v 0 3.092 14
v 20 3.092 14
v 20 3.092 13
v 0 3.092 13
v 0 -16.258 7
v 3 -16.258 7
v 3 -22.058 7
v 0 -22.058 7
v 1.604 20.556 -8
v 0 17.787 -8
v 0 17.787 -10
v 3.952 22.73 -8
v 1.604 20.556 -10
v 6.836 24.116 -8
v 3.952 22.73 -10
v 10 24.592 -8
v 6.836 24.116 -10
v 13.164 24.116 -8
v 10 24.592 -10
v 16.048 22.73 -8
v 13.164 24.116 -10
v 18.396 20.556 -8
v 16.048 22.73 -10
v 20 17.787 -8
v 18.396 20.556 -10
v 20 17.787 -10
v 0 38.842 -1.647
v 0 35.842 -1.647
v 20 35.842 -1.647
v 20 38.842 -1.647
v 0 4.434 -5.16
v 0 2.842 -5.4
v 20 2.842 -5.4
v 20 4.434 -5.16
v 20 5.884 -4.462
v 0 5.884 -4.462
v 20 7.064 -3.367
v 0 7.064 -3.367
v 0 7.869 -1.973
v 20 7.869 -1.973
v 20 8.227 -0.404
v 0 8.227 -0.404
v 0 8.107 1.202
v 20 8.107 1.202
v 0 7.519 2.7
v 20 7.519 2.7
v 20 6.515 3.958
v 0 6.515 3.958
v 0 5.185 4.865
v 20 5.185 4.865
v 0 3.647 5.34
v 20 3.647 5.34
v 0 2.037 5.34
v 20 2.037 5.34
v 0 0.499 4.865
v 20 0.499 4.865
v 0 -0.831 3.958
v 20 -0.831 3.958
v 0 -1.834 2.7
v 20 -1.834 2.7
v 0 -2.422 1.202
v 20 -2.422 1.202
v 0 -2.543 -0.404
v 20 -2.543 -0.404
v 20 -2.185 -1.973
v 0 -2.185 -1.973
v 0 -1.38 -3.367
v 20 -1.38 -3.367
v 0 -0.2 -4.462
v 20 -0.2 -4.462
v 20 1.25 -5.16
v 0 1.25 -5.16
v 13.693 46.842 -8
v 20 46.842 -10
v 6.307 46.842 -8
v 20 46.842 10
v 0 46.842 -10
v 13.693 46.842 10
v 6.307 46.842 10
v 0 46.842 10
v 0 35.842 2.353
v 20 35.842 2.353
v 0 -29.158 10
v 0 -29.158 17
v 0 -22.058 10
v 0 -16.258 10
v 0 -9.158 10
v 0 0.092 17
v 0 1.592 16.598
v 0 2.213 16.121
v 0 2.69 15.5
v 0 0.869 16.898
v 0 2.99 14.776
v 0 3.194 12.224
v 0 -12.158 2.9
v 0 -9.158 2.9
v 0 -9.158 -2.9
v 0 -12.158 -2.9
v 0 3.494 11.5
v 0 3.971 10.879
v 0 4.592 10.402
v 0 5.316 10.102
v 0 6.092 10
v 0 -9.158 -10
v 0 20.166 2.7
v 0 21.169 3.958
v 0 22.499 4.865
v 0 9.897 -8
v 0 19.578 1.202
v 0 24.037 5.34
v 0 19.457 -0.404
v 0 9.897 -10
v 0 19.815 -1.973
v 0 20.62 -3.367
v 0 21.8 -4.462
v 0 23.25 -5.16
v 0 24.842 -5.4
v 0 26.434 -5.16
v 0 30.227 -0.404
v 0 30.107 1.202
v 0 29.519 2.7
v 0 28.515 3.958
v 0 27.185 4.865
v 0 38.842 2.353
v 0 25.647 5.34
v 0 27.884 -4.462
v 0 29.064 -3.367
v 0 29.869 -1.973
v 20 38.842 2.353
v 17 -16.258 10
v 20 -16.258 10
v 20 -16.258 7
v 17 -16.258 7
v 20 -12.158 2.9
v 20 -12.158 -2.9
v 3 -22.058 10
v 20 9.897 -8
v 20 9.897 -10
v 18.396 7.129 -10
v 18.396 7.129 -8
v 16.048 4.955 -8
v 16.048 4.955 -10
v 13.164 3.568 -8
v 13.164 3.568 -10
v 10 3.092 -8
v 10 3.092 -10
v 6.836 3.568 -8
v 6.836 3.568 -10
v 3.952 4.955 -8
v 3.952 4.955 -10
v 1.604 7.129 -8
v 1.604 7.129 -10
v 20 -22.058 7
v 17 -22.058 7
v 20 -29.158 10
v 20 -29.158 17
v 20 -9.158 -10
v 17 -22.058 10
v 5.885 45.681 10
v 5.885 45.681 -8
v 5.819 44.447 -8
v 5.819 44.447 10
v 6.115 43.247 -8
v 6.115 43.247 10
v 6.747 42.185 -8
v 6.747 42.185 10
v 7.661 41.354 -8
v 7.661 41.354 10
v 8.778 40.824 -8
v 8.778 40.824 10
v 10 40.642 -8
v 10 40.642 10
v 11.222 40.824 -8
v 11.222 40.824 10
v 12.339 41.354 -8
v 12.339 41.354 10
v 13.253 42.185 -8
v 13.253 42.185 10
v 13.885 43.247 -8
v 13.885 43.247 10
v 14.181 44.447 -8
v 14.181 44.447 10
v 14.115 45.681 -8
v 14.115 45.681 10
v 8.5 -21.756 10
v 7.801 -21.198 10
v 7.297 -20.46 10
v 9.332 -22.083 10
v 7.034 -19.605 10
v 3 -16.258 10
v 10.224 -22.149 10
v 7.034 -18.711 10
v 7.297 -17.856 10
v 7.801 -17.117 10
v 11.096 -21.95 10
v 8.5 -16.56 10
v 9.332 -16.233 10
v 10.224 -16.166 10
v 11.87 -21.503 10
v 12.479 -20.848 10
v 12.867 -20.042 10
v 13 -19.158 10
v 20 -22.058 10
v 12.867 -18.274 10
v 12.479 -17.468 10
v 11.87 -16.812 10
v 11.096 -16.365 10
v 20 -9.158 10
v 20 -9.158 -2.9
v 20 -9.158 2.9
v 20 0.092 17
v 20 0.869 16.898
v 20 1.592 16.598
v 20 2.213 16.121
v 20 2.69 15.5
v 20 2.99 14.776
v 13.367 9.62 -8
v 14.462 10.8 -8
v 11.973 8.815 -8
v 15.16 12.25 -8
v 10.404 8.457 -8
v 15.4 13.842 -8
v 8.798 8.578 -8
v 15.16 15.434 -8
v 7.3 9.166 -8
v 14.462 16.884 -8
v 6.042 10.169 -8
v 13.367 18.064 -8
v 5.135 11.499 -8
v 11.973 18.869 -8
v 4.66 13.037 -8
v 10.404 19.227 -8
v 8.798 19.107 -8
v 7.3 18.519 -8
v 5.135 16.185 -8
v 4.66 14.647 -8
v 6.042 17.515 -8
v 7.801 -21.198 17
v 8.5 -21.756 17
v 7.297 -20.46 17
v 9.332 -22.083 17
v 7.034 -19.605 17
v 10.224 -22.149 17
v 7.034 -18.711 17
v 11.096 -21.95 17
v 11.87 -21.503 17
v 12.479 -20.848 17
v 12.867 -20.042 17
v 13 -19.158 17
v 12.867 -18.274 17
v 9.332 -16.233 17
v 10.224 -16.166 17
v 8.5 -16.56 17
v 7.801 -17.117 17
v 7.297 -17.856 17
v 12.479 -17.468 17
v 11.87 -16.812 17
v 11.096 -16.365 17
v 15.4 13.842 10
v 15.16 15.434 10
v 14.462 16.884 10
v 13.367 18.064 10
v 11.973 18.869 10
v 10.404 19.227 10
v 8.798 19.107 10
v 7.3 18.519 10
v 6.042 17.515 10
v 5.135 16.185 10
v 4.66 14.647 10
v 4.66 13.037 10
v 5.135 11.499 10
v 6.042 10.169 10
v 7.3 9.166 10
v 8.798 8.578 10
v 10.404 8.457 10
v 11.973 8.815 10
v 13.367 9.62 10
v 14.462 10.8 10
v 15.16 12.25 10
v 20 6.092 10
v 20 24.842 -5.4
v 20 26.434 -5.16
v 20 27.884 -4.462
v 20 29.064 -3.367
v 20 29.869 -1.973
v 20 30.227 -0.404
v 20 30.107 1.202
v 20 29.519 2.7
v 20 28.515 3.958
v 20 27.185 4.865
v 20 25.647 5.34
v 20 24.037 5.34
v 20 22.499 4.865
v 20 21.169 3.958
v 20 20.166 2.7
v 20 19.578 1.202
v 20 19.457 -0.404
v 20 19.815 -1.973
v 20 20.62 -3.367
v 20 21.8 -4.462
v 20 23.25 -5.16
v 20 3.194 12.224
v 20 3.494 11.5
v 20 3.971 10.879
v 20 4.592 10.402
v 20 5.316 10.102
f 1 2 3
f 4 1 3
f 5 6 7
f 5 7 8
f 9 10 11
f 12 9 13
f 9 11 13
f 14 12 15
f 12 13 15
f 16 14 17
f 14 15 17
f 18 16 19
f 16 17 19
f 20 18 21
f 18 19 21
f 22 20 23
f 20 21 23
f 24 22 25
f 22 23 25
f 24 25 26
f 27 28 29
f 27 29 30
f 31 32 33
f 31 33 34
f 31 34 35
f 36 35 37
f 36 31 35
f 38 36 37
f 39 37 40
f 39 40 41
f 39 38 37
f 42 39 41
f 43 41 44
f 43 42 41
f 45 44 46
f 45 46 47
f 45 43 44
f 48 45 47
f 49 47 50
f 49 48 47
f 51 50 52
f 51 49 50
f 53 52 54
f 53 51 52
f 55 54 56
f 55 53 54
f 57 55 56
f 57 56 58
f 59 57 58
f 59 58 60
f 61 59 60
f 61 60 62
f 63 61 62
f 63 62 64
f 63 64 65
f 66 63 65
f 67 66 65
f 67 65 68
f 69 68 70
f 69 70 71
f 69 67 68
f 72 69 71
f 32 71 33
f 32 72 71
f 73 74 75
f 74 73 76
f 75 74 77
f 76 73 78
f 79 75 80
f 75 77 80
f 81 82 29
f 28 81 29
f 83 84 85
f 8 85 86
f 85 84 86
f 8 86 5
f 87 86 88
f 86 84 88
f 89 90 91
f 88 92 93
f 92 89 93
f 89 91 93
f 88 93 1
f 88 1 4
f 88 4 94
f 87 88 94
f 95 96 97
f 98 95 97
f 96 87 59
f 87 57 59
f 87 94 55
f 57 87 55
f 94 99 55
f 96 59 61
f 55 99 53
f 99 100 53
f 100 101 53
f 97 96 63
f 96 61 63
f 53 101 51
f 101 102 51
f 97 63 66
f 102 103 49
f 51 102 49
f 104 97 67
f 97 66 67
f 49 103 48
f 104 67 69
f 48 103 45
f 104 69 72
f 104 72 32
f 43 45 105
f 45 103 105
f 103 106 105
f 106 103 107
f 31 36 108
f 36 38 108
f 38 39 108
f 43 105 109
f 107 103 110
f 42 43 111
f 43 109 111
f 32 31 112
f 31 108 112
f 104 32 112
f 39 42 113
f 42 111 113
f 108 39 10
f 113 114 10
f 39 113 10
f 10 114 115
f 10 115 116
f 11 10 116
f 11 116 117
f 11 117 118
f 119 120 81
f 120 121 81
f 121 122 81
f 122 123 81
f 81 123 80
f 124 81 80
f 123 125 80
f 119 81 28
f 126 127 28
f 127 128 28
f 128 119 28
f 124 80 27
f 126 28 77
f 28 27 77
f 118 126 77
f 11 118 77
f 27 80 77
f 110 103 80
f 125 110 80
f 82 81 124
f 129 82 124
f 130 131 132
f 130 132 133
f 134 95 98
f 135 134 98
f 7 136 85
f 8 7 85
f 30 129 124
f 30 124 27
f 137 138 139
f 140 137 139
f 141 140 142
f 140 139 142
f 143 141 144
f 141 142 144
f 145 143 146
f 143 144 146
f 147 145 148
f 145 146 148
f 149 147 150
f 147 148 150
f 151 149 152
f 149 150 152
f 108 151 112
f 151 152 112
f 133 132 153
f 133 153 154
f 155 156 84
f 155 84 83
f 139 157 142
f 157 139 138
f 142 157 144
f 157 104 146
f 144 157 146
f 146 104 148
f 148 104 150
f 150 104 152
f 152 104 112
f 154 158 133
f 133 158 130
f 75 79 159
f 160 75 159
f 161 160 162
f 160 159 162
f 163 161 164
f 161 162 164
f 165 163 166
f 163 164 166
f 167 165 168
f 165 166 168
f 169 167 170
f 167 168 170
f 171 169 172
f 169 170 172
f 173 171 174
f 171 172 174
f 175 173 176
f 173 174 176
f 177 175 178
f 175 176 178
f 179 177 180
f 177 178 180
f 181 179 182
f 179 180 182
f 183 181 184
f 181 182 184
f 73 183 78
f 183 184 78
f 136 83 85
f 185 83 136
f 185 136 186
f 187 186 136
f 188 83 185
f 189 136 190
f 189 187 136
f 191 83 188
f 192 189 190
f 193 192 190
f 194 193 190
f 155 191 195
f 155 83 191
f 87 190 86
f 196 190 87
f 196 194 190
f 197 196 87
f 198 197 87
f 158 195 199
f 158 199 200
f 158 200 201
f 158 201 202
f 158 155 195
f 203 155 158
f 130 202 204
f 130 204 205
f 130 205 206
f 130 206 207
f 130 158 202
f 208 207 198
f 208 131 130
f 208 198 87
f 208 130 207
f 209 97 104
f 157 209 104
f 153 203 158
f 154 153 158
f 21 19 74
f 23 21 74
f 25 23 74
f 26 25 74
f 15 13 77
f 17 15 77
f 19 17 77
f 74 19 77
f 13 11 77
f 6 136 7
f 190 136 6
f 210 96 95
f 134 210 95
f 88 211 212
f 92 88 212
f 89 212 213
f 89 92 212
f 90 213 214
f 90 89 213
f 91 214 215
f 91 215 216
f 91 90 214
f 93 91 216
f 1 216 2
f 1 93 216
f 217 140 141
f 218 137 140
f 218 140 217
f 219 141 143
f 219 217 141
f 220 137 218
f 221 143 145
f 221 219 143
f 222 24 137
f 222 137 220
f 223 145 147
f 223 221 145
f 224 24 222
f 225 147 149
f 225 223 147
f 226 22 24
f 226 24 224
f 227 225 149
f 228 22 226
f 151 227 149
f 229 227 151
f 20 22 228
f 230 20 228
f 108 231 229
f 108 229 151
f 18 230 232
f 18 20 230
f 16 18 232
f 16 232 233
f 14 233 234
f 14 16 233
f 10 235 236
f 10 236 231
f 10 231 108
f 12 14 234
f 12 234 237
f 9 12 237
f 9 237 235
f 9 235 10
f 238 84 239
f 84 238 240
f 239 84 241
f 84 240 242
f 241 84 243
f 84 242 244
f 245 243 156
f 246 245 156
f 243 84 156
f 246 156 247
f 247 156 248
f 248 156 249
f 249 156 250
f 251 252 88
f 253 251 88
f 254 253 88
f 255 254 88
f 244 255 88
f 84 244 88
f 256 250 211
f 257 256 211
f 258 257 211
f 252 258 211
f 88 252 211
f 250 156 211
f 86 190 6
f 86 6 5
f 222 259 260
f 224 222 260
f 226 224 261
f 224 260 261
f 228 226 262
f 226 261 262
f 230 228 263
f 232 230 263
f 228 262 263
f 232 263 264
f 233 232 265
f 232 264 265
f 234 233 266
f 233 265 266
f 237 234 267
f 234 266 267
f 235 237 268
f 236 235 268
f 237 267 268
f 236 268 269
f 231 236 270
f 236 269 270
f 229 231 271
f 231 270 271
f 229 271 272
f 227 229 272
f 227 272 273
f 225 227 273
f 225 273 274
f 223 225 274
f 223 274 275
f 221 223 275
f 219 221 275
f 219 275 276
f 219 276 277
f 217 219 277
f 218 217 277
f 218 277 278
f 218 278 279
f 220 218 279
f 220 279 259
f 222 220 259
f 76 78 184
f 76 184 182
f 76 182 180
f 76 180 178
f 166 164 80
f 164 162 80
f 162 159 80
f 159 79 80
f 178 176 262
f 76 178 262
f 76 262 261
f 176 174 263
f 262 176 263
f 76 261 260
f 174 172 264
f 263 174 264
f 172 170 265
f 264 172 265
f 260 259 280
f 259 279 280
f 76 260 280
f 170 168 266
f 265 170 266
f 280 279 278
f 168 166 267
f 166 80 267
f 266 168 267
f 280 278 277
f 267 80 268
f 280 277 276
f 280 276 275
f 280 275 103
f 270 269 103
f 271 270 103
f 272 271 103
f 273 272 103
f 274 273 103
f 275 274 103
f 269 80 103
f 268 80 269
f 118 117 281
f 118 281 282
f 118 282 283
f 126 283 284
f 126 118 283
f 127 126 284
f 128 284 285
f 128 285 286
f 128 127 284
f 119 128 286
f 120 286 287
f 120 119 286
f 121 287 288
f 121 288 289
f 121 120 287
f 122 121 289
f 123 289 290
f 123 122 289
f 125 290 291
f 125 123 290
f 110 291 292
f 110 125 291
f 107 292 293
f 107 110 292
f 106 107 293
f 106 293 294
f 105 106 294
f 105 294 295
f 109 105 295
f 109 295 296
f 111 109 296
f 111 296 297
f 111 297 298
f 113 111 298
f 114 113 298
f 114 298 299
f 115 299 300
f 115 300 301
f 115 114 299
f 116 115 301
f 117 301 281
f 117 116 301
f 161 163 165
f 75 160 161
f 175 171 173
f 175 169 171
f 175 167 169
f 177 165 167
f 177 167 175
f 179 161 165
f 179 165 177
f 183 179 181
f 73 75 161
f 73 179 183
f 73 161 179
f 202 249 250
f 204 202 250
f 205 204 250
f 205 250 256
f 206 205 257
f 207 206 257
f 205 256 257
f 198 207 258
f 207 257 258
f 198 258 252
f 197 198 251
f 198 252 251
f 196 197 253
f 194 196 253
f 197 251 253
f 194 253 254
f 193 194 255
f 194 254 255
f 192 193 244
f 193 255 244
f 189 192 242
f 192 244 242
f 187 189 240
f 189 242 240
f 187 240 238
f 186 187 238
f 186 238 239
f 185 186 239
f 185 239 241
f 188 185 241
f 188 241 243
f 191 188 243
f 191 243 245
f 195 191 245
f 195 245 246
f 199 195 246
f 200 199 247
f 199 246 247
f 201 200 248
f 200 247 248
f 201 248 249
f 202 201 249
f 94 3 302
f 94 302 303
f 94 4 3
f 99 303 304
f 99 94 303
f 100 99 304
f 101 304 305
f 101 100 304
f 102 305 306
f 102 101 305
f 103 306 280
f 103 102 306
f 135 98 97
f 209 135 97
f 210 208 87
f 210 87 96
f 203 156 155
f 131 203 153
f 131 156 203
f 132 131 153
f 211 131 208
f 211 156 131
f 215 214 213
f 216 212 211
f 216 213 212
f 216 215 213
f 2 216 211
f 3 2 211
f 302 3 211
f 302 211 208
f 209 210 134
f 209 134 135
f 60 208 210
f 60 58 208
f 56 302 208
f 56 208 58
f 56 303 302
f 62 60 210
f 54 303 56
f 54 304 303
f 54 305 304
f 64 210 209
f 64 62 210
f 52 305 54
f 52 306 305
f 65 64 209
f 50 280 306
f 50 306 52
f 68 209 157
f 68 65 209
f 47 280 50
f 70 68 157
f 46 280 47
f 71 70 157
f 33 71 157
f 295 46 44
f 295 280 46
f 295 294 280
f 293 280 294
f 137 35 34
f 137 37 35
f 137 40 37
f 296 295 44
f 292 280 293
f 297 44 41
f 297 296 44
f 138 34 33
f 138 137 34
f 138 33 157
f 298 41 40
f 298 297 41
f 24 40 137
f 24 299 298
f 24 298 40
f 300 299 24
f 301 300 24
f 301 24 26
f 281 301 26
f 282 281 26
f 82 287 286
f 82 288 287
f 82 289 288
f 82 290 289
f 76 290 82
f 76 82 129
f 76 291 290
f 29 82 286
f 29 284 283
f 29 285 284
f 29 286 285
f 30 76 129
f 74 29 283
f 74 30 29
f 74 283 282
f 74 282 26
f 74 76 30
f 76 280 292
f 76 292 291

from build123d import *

# Parameters (mm, degrees)
SKETCH24_R          = 5.4
SKETCH24_W          = 4
SKETCH24_H          = 3
BOSS_EXTRUDE1_DEPTH = 20
SKETCH28_W          = 7
SKETCH28_H          = 32.25
BOSS_EXTRUDE2_DEPTH = 20
SKETCH25_R          = 5.4
CUT_EXTRUDE1_DEPTH  = 20
SKETCH26_R          = 4.2
CUT_EXTRUDE2_DEPTH  = 18
SKETCH27_R          = 10.75
CUT_EXTRUDE3_DEPTH  = 2
FILLET4_R           = 3
FILLET6_R           = 3
SKETCH31_R          = 3
CUT_EXTRUDE5_DEPTH  = 7
SKETCH32_W          = 3
SKETCH32_H          = 5.8
BOSS_EXTRUDE3_DEPTH = 3


with BuildPart() as part:
    # Sketch24 → Boss-Extrude1 (new body)
    with BuildSketch(Plane(origin=(0, 0, 0), x_dir=(0, 0, -1), z_dir=(1, 0, 0))):
        Polygon((10, -9.157855987), (10, 46.842144013), (-10, 46.842144013), (-10, -9.157855987), (-2.9, -9.157855987), (-2.9, -12.157855987), (2.9, -12.157855987), (2.9, -9.157855987), align=None)
        with Locations((0, 24.842144013)):
            Circle(SKETCH24_R, mode=Mode.SUBTRACT)
        with Locations((0, 2.842144013)):
            Circle(SKETCH24_R, mode=Mode.SUBTRACT)
        with Locations((-0.353280434, 37.342144013)):
            Rectangle(SKETCH24_W, SKETCH24_H, mode=Mode.SUBTRACT)
    extrude(amount=BOSS_EXTRUDE1_DEPTH)

    # Sketch28 → Boss-Extrude2 (add)
    with BuildSketch(Plane(origin=(20, 0, 0), x_dir=(0, 0, -1), z_dir=(1, 0, 0))):
        with Locations((-13.5, -13.032855987)):
            Rectangle(SKETCH28_W, SKETCH28_H)
    extrude(amount=-BOSS_EXTRUDE2_DEPTH)

    # Sketch25 → Cut-Extrude1 (cut)
    with BuildSketch(Plane.XY.offset(10)):
        with Locations((10, 13.842144013)):
            Circle(SKETCH25_R)
    extrude(amount=-CUT_EXTRUDE1_DEPTH, mode=Mode.SUBTRACT)

    # Sketch26 → Cut-Extrude2 (cut)
    with BuildSketch(Plane.XY.offset(10)):
        with Locations((10, 44.842144013)):
            Circle(SKETCH26_R)
    extrude(amount=-CUT_EXTRUDE2_DEPTH, mode=Mode.SUBTRACT)

    # Sketch27 → Cut-Extrude3 (cut)
    with BuildSketch(Plane(origin=(0, 0, -10), x_dir=(-1, 0, 0), z_dir=(0, 0, -1))):
        with Locations((-10, 13.842144013)):
            Circle(SKETCH27_R)
    extrude(amount=-CUT_EXTRUDE3_DEPTH, mode=Mode.SUBTRACT)

    # Fillet4
    fillet4_edges = [part.edges().sort_by_distance(p)[0] for p in [
        (10, 3.092144013, 17),
    ]]
    fillet(fillet4_edges, radius=FILLET4_R)

    # Fillet6
    fillet6_edges = [part.edges().sort_by_distance(p)[0] for p in [
        (10, 3.092144013, 10),
    ]]
    fillet(fillet6_edges, radius=FILLET6_R)

    # Sketch31 → Cut-Extrude5 (cut)
    with BuildSketch(Plane.XY.offset(17)):
        with Locations((10, -19.157855987)):
            Circle(SKETCH31_R)
    extrude(amount=-CUT_EXTRUDE5_DEPTH, mode=Mode.SUBTRACT)

    # Sketch32 → Boss-Extrude3 (add)
    with BuildSketch(Plane(origin=(0, 0, 10), x_dir=(-1, 0, 0), z_dir=(0, 0, -1))):
        with Locations((-1.5, -19.157855987)):
            Rectangle(SKETCH32_W, SKETCH32_H)
        with Locations((-18.5, -19.157855987)):
            Rectangle(SKETCH32_W, SKETCH32_H)
    extrude(amount=BOSS_EXTRUDE3_DEPTH)


solid = part.part
